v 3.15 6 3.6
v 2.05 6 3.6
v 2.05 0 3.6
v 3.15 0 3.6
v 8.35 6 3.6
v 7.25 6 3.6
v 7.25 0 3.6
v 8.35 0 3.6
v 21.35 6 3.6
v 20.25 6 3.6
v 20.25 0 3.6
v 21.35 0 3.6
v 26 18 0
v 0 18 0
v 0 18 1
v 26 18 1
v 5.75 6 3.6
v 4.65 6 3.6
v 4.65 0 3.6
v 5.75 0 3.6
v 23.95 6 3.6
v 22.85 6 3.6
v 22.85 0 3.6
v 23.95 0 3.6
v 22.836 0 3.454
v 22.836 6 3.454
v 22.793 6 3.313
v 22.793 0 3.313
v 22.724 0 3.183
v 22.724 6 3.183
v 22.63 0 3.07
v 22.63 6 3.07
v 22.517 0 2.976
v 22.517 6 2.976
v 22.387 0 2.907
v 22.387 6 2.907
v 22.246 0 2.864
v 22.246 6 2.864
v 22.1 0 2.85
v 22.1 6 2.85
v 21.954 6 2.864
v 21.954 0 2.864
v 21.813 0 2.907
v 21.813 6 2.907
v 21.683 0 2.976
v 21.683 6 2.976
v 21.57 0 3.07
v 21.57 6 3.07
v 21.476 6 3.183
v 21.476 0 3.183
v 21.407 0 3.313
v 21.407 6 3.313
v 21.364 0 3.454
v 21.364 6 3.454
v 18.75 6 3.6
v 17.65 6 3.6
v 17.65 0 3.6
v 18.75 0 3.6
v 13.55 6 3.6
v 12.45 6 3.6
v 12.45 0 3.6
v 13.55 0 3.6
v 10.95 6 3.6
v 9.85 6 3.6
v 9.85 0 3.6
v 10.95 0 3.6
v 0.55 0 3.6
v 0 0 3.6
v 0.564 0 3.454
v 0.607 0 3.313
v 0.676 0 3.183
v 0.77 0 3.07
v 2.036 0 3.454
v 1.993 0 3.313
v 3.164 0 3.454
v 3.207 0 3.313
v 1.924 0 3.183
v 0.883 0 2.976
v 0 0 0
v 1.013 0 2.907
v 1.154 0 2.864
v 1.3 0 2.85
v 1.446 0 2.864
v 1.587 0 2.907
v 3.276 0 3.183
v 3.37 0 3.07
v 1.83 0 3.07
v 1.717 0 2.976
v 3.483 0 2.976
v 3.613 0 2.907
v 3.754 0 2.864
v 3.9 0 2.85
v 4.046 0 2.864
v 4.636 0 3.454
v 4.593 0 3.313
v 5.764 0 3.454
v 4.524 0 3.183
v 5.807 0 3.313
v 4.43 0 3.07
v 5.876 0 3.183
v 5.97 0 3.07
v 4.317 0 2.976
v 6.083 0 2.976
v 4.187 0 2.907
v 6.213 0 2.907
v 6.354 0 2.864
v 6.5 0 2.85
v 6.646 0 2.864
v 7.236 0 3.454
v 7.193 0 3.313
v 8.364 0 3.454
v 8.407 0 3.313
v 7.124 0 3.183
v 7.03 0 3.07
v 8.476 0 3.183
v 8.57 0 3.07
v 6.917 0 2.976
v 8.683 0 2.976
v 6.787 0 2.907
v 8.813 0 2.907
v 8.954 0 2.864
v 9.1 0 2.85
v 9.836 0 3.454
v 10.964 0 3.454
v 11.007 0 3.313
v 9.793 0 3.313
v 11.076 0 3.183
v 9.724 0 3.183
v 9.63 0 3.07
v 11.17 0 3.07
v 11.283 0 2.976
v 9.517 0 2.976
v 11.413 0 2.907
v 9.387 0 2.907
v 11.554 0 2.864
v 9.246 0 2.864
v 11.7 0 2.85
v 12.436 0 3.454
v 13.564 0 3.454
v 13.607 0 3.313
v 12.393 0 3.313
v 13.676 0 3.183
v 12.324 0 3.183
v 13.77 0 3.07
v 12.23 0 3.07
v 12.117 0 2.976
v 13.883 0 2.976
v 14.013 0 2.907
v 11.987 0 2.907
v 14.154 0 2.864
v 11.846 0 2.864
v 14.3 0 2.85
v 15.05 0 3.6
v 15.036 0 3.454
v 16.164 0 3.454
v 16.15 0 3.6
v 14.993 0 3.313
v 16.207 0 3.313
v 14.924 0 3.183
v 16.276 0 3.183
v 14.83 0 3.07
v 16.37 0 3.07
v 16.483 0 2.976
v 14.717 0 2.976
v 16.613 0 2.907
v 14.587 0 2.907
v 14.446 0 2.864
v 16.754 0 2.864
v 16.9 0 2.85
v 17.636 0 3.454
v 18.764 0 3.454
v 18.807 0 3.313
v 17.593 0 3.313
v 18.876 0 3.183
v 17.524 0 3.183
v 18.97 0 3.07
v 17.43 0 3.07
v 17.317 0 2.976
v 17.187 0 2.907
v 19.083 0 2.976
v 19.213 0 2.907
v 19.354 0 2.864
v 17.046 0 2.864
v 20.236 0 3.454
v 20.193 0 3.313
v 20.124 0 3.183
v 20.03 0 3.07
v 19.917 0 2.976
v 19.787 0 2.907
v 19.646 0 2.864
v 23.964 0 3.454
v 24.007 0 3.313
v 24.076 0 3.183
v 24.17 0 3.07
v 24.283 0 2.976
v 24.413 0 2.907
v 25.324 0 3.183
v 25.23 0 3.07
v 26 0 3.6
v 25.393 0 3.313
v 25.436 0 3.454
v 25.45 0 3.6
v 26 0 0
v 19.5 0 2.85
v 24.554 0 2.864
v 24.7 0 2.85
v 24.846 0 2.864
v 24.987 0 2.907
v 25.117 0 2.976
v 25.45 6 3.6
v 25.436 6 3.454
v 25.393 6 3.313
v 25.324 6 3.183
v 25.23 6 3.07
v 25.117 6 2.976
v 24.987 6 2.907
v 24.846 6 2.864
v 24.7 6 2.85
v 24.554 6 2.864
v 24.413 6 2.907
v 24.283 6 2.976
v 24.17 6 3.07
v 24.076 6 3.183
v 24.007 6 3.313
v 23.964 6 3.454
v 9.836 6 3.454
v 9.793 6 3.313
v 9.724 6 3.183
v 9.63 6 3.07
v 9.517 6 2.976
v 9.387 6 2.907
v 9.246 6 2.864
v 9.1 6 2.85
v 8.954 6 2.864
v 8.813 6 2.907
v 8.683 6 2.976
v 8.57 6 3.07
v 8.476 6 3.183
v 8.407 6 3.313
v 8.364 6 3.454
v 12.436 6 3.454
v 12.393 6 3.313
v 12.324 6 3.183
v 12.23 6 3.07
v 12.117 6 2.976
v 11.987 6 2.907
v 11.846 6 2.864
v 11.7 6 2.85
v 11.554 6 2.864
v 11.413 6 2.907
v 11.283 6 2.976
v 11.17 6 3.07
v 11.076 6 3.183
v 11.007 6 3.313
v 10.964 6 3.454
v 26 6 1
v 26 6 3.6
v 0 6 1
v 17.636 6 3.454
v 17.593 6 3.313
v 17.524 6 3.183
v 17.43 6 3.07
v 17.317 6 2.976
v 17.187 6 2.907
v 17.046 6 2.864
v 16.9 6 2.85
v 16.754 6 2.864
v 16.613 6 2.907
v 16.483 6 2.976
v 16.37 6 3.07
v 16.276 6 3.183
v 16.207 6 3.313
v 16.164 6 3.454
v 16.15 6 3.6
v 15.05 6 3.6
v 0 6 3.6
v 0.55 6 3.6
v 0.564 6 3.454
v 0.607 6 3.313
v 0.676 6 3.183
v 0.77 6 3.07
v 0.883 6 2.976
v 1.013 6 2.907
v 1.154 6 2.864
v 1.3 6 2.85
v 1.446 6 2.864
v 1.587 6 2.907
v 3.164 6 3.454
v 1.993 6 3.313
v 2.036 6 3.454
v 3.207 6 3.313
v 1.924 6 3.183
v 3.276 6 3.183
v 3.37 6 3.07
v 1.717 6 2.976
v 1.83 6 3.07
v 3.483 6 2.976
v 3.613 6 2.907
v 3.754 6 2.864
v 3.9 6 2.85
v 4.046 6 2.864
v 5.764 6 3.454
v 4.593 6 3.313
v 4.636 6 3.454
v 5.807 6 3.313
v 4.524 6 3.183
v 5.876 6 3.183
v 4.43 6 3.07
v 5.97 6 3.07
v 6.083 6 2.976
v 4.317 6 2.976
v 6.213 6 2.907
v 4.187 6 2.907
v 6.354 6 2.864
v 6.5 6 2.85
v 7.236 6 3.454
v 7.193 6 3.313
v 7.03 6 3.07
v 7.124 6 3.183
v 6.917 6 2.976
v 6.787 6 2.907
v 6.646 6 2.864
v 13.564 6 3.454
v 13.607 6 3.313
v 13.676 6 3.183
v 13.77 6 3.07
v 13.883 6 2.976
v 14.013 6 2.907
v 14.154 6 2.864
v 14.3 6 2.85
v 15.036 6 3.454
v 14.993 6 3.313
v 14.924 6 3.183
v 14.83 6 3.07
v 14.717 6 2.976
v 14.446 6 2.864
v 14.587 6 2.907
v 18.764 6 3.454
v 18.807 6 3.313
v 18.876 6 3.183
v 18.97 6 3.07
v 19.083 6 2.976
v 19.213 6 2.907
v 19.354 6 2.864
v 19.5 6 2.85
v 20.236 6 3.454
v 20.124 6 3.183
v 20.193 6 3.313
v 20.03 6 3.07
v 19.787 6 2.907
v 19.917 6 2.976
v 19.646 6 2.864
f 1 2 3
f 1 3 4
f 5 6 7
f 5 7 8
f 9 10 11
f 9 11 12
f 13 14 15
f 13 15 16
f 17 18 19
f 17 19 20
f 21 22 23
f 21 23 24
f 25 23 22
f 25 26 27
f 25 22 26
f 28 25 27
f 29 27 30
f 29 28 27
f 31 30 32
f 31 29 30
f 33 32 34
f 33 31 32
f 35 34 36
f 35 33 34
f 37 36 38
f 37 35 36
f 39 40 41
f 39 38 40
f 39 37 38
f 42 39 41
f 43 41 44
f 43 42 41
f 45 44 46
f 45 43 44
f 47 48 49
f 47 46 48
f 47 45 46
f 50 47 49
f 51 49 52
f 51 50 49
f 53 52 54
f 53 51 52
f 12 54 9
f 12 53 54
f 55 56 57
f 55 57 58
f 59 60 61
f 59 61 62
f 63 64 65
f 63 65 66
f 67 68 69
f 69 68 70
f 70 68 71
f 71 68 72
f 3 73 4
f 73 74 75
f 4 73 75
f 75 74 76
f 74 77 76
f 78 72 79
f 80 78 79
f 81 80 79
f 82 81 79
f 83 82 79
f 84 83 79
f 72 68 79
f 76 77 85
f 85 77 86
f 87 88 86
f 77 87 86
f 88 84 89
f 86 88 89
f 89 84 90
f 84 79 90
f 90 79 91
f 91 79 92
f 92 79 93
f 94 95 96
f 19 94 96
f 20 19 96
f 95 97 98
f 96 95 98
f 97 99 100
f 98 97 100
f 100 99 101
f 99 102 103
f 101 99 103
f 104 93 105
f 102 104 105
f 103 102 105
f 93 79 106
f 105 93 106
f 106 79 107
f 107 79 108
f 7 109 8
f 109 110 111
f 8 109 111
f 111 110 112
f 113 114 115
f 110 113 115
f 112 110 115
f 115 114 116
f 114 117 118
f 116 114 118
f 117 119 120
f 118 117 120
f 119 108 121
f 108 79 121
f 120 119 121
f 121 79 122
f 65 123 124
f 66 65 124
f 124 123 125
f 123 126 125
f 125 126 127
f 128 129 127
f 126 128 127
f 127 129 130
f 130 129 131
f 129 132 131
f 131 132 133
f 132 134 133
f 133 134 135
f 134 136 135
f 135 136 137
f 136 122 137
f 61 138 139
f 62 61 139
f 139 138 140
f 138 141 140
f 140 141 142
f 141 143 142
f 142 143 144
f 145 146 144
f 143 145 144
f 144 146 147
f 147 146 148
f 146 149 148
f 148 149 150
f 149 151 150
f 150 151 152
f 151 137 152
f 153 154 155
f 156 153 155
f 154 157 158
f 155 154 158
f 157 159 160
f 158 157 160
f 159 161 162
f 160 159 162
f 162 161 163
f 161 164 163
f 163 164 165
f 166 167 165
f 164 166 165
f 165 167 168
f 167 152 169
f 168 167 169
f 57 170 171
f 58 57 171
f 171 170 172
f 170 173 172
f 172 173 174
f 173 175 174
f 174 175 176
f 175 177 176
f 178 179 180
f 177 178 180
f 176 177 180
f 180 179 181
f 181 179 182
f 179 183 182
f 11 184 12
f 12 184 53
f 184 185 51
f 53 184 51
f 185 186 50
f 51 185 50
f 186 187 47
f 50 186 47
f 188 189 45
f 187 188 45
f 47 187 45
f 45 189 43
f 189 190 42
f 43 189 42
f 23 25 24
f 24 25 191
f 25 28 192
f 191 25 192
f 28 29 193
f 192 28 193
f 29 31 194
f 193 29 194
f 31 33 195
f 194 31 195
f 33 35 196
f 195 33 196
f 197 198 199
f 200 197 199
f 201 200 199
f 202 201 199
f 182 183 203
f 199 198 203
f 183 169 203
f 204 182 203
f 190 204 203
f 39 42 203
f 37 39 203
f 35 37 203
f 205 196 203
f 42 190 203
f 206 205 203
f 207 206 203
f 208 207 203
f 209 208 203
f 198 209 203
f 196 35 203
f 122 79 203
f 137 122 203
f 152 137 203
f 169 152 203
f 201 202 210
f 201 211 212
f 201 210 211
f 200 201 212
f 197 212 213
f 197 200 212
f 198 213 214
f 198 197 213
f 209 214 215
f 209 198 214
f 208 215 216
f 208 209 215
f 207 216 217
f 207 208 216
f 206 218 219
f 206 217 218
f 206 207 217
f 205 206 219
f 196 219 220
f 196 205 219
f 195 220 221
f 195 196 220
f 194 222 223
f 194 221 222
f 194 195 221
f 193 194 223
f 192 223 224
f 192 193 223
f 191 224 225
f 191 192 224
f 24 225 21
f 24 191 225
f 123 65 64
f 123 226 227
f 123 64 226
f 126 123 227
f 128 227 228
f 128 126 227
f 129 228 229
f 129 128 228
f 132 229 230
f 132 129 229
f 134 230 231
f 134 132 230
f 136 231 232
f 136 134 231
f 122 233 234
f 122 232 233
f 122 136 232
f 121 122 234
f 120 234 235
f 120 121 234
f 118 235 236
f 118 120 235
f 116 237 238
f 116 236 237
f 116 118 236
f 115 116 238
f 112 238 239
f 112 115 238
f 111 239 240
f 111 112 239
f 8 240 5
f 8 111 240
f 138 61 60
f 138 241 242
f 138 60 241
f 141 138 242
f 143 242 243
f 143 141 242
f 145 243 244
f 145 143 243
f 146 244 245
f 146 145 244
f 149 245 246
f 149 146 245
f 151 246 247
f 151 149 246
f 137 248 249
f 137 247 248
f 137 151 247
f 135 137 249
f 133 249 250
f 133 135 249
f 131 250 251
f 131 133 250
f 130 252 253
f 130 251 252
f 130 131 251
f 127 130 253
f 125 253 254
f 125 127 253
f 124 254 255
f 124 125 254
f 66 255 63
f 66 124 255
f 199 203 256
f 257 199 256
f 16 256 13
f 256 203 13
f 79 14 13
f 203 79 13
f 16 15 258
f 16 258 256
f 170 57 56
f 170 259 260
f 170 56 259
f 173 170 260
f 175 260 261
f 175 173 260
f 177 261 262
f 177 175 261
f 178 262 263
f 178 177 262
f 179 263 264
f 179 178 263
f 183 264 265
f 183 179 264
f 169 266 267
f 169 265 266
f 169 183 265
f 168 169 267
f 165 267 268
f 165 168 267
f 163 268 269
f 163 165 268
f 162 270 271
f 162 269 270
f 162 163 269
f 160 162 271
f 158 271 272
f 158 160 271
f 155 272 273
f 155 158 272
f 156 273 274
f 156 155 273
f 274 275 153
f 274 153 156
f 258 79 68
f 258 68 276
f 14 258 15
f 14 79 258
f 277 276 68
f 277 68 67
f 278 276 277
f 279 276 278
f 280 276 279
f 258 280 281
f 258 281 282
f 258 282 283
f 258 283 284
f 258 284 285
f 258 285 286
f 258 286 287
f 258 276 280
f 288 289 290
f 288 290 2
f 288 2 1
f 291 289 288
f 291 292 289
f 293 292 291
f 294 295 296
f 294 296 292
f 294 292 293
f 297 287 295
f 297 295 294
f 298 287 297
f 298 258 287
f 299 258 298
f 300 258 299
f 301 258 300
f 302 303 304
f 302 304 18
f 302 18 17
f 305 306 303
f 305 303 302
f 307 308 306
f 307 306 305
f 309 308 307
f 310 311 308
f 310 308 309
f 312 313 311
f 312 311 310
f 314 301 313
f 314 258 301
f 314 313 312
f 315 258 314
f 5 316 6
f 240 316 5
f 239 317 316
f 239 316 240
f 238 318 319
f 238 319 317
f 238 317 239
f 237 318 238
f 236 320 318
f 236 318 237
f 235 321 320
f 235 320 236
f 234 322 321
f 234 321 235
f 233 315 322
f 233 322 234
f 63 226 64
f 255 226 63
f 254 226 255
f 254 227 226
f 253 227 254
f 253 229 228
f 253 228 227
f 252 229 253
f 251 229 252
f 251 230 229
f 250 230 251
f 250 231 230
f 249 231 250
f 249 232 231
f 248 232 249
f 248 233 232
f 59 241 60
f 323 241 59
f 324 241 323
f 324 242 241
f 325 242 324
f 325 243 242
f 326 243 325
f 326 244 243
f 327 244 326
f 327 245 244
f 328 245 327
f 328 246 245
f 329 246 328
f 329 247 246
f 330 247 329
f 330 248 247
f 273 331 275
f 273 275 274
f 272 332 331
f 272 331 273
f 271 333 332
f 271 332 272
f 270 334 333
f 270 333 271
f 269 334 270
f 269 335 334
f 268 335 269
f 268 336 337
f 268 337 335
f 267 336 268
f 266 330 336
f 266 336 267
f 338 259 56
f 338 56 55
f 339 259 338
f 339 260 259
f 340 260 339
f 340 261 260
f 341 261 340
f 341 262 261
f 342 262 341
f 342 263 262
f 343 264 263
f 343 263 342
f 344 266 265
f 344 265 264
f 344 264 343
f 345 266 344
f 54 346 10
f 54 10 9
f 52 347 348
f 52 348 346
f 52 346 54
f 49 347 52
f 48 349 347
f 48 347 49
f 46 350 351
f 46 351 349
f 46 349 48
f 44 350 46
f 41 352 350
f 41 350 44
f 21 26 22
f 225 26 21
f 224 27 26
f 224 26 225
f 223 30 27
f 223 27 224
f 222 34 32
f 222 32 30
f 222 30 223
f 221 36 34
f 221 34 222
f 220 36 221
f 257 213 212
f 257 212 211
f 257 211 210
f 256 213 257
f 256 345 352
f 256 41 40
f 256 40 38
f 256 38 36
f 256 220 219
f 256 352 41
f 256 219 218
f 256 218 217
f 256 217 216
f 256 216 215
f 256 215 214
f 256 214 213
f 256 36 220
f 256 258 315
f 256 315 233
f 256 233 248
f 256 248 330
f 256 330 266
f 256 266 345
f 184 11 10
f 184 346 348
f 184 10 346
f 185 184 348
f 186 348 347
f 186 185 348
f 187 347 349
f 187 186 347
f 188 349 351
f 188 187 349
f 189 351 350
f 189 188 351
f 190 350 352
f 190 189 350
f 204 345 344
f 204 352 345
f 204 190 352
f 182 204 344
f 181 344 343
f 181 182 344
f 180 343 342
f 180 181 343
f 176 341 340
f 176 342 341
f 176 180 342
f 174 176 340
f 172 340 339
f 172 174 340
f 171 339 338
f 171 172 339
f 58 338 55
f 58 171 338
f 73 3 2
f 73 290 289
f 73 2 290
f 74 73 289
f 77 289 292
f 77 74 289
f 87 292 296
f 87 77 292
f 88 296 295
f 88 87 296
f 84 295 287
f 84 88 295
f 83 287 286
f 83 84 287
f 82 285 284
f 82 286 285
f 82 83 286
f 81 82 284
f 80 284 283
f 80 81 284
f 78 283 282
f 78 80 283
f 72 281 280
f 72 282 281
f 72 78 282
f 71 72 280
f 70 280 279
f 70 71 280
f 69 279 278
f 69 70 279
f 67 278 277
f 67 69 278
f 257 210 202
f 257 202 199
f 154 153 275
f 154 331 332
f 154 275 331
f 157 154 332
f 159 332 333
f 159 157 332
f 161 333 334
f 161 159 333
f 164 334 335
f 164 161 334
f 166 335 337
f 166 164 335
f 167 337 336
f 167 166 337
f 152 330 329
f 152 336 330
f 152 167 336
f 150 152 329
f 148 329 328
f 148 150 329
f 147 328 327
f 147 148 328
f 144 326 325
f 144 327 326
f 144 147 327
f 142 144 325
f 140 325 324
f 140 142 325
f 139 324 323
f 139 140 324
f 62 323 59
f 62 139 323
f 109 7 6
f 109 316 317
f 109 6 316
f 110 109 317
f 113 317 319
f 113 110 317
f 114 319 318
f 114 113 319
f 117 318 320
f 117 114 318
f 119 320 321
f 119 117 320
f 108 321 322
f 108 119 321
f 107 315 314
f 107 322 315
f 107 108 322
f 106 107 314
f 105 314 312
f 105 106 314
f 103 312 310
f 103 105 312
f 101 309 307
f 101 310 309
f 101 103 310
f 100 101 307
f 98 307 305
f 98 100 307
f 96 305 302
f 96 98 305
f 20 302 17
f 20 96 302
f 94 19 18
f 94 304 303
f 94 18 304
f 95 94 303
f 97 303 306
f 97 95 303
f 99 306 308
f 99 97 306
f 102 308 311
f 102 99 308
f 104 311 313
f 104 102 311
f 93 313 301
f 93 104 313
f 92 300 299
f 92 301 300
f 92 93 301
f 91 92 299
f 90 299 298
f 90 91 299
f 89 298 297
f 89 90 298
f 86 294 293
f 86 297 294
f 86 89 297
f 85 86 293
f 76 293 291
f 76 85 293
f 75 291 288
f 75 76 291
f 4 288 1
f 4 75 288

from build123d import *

# Parameters (mm, degrees)
BOX026_W          = 30
BOX026_H          = 20
BOX026_DEPTH      = 9.2
CYLINDER008_R     = 0.75
CYLINDER008_DEPTH = 7
ARRAY008_X_COUNT  = 10
ARRAY008_X_PITCH  = 2.6
ARRAY008_Y_COUNT  = 2
ARRAY008_Y_PITCH  = 1
BOX025_W          = 26
BOX025_H          = 12
BOX025_DEPTH      = 5.2
BOX024_W          = 26
BOX024_H          = 18
BOX024_DEPTH      = 7.2


with BuildPart() as cortador008:
    # Box026 → Box026 (new body)
    with BuildSketch(Plane(origin=(-1, -1, 3.6), x_dir=(1, 0, 0), z_dir=(0, 0, 1))):
        with Locations((15, 10)):
            Rectangle(BOX026_W, BOX026_H)
    extrude(amount=BOX026_DEPTH)


with BuildPart() as array008:
    # Cylinder008 → Cylinder008 (new body)
    with BuildSketch(Plane(origin=(1.3, -1, 3.6), x_dir=(1, 0, 0), z_dir=(0, 1, 0))):
        Circle(CYLINDER008_R)
    extrude(amount=CYLINDER008_DEPTH)

    # Array008 X: Array008 ×10


with BuildPart() as array008_1:
    add(array008.part)
    with Locations(*[(i * ARRAY008_X_PITCH, 0, 0) for i in range(1, ARRAY008_X_COUNT)]):
        add(array008.part)

    # Array008 Y: Array008 ×2


with BuildPart() as array008_2:
    add(array008_1.part)
    with Locations(*[(0, i * ARRAY008_Y_PITCH, 0) for i in range(1, ARRAY008_Y_COUNT)]):
        add(array008_1.part)


with BuildPart() as cube_10_base011:
    # Box025 → Box025 (new body)
    with BuildSketch(Plane(origin=(0, 6, 1), x_dir=(1, 0, 0), z_dir=(0, 0, 1))):
        with Locations((13, 6)):
            Rectangle(BOX025_W, BOX025_H)
    extrude(amount=BOX025_DEPTH)


with BuildPart() as bloque_10_arriba:
    # Box024 → Box024 (new body)
    with BuildSketch(Plane.XY):
        with Locations((13, 9)):
            Rectangle(BOX024_W, BOX024_H)
    extrude(amount=BOX024_DEPTH)

    # Cut025: cut cube_10_base011
    add(cube_10_base011.part, mode=Mode.SUBTRACT)

    # Cut024: cut Array008
    add(array008_2.part, mode=Mode.SUBTRACT)

    # Cut027: cut cortador008
    add(cortador008.part, mode=Mode.SUBTRACT)


solid = bloque_10_arriba.part
